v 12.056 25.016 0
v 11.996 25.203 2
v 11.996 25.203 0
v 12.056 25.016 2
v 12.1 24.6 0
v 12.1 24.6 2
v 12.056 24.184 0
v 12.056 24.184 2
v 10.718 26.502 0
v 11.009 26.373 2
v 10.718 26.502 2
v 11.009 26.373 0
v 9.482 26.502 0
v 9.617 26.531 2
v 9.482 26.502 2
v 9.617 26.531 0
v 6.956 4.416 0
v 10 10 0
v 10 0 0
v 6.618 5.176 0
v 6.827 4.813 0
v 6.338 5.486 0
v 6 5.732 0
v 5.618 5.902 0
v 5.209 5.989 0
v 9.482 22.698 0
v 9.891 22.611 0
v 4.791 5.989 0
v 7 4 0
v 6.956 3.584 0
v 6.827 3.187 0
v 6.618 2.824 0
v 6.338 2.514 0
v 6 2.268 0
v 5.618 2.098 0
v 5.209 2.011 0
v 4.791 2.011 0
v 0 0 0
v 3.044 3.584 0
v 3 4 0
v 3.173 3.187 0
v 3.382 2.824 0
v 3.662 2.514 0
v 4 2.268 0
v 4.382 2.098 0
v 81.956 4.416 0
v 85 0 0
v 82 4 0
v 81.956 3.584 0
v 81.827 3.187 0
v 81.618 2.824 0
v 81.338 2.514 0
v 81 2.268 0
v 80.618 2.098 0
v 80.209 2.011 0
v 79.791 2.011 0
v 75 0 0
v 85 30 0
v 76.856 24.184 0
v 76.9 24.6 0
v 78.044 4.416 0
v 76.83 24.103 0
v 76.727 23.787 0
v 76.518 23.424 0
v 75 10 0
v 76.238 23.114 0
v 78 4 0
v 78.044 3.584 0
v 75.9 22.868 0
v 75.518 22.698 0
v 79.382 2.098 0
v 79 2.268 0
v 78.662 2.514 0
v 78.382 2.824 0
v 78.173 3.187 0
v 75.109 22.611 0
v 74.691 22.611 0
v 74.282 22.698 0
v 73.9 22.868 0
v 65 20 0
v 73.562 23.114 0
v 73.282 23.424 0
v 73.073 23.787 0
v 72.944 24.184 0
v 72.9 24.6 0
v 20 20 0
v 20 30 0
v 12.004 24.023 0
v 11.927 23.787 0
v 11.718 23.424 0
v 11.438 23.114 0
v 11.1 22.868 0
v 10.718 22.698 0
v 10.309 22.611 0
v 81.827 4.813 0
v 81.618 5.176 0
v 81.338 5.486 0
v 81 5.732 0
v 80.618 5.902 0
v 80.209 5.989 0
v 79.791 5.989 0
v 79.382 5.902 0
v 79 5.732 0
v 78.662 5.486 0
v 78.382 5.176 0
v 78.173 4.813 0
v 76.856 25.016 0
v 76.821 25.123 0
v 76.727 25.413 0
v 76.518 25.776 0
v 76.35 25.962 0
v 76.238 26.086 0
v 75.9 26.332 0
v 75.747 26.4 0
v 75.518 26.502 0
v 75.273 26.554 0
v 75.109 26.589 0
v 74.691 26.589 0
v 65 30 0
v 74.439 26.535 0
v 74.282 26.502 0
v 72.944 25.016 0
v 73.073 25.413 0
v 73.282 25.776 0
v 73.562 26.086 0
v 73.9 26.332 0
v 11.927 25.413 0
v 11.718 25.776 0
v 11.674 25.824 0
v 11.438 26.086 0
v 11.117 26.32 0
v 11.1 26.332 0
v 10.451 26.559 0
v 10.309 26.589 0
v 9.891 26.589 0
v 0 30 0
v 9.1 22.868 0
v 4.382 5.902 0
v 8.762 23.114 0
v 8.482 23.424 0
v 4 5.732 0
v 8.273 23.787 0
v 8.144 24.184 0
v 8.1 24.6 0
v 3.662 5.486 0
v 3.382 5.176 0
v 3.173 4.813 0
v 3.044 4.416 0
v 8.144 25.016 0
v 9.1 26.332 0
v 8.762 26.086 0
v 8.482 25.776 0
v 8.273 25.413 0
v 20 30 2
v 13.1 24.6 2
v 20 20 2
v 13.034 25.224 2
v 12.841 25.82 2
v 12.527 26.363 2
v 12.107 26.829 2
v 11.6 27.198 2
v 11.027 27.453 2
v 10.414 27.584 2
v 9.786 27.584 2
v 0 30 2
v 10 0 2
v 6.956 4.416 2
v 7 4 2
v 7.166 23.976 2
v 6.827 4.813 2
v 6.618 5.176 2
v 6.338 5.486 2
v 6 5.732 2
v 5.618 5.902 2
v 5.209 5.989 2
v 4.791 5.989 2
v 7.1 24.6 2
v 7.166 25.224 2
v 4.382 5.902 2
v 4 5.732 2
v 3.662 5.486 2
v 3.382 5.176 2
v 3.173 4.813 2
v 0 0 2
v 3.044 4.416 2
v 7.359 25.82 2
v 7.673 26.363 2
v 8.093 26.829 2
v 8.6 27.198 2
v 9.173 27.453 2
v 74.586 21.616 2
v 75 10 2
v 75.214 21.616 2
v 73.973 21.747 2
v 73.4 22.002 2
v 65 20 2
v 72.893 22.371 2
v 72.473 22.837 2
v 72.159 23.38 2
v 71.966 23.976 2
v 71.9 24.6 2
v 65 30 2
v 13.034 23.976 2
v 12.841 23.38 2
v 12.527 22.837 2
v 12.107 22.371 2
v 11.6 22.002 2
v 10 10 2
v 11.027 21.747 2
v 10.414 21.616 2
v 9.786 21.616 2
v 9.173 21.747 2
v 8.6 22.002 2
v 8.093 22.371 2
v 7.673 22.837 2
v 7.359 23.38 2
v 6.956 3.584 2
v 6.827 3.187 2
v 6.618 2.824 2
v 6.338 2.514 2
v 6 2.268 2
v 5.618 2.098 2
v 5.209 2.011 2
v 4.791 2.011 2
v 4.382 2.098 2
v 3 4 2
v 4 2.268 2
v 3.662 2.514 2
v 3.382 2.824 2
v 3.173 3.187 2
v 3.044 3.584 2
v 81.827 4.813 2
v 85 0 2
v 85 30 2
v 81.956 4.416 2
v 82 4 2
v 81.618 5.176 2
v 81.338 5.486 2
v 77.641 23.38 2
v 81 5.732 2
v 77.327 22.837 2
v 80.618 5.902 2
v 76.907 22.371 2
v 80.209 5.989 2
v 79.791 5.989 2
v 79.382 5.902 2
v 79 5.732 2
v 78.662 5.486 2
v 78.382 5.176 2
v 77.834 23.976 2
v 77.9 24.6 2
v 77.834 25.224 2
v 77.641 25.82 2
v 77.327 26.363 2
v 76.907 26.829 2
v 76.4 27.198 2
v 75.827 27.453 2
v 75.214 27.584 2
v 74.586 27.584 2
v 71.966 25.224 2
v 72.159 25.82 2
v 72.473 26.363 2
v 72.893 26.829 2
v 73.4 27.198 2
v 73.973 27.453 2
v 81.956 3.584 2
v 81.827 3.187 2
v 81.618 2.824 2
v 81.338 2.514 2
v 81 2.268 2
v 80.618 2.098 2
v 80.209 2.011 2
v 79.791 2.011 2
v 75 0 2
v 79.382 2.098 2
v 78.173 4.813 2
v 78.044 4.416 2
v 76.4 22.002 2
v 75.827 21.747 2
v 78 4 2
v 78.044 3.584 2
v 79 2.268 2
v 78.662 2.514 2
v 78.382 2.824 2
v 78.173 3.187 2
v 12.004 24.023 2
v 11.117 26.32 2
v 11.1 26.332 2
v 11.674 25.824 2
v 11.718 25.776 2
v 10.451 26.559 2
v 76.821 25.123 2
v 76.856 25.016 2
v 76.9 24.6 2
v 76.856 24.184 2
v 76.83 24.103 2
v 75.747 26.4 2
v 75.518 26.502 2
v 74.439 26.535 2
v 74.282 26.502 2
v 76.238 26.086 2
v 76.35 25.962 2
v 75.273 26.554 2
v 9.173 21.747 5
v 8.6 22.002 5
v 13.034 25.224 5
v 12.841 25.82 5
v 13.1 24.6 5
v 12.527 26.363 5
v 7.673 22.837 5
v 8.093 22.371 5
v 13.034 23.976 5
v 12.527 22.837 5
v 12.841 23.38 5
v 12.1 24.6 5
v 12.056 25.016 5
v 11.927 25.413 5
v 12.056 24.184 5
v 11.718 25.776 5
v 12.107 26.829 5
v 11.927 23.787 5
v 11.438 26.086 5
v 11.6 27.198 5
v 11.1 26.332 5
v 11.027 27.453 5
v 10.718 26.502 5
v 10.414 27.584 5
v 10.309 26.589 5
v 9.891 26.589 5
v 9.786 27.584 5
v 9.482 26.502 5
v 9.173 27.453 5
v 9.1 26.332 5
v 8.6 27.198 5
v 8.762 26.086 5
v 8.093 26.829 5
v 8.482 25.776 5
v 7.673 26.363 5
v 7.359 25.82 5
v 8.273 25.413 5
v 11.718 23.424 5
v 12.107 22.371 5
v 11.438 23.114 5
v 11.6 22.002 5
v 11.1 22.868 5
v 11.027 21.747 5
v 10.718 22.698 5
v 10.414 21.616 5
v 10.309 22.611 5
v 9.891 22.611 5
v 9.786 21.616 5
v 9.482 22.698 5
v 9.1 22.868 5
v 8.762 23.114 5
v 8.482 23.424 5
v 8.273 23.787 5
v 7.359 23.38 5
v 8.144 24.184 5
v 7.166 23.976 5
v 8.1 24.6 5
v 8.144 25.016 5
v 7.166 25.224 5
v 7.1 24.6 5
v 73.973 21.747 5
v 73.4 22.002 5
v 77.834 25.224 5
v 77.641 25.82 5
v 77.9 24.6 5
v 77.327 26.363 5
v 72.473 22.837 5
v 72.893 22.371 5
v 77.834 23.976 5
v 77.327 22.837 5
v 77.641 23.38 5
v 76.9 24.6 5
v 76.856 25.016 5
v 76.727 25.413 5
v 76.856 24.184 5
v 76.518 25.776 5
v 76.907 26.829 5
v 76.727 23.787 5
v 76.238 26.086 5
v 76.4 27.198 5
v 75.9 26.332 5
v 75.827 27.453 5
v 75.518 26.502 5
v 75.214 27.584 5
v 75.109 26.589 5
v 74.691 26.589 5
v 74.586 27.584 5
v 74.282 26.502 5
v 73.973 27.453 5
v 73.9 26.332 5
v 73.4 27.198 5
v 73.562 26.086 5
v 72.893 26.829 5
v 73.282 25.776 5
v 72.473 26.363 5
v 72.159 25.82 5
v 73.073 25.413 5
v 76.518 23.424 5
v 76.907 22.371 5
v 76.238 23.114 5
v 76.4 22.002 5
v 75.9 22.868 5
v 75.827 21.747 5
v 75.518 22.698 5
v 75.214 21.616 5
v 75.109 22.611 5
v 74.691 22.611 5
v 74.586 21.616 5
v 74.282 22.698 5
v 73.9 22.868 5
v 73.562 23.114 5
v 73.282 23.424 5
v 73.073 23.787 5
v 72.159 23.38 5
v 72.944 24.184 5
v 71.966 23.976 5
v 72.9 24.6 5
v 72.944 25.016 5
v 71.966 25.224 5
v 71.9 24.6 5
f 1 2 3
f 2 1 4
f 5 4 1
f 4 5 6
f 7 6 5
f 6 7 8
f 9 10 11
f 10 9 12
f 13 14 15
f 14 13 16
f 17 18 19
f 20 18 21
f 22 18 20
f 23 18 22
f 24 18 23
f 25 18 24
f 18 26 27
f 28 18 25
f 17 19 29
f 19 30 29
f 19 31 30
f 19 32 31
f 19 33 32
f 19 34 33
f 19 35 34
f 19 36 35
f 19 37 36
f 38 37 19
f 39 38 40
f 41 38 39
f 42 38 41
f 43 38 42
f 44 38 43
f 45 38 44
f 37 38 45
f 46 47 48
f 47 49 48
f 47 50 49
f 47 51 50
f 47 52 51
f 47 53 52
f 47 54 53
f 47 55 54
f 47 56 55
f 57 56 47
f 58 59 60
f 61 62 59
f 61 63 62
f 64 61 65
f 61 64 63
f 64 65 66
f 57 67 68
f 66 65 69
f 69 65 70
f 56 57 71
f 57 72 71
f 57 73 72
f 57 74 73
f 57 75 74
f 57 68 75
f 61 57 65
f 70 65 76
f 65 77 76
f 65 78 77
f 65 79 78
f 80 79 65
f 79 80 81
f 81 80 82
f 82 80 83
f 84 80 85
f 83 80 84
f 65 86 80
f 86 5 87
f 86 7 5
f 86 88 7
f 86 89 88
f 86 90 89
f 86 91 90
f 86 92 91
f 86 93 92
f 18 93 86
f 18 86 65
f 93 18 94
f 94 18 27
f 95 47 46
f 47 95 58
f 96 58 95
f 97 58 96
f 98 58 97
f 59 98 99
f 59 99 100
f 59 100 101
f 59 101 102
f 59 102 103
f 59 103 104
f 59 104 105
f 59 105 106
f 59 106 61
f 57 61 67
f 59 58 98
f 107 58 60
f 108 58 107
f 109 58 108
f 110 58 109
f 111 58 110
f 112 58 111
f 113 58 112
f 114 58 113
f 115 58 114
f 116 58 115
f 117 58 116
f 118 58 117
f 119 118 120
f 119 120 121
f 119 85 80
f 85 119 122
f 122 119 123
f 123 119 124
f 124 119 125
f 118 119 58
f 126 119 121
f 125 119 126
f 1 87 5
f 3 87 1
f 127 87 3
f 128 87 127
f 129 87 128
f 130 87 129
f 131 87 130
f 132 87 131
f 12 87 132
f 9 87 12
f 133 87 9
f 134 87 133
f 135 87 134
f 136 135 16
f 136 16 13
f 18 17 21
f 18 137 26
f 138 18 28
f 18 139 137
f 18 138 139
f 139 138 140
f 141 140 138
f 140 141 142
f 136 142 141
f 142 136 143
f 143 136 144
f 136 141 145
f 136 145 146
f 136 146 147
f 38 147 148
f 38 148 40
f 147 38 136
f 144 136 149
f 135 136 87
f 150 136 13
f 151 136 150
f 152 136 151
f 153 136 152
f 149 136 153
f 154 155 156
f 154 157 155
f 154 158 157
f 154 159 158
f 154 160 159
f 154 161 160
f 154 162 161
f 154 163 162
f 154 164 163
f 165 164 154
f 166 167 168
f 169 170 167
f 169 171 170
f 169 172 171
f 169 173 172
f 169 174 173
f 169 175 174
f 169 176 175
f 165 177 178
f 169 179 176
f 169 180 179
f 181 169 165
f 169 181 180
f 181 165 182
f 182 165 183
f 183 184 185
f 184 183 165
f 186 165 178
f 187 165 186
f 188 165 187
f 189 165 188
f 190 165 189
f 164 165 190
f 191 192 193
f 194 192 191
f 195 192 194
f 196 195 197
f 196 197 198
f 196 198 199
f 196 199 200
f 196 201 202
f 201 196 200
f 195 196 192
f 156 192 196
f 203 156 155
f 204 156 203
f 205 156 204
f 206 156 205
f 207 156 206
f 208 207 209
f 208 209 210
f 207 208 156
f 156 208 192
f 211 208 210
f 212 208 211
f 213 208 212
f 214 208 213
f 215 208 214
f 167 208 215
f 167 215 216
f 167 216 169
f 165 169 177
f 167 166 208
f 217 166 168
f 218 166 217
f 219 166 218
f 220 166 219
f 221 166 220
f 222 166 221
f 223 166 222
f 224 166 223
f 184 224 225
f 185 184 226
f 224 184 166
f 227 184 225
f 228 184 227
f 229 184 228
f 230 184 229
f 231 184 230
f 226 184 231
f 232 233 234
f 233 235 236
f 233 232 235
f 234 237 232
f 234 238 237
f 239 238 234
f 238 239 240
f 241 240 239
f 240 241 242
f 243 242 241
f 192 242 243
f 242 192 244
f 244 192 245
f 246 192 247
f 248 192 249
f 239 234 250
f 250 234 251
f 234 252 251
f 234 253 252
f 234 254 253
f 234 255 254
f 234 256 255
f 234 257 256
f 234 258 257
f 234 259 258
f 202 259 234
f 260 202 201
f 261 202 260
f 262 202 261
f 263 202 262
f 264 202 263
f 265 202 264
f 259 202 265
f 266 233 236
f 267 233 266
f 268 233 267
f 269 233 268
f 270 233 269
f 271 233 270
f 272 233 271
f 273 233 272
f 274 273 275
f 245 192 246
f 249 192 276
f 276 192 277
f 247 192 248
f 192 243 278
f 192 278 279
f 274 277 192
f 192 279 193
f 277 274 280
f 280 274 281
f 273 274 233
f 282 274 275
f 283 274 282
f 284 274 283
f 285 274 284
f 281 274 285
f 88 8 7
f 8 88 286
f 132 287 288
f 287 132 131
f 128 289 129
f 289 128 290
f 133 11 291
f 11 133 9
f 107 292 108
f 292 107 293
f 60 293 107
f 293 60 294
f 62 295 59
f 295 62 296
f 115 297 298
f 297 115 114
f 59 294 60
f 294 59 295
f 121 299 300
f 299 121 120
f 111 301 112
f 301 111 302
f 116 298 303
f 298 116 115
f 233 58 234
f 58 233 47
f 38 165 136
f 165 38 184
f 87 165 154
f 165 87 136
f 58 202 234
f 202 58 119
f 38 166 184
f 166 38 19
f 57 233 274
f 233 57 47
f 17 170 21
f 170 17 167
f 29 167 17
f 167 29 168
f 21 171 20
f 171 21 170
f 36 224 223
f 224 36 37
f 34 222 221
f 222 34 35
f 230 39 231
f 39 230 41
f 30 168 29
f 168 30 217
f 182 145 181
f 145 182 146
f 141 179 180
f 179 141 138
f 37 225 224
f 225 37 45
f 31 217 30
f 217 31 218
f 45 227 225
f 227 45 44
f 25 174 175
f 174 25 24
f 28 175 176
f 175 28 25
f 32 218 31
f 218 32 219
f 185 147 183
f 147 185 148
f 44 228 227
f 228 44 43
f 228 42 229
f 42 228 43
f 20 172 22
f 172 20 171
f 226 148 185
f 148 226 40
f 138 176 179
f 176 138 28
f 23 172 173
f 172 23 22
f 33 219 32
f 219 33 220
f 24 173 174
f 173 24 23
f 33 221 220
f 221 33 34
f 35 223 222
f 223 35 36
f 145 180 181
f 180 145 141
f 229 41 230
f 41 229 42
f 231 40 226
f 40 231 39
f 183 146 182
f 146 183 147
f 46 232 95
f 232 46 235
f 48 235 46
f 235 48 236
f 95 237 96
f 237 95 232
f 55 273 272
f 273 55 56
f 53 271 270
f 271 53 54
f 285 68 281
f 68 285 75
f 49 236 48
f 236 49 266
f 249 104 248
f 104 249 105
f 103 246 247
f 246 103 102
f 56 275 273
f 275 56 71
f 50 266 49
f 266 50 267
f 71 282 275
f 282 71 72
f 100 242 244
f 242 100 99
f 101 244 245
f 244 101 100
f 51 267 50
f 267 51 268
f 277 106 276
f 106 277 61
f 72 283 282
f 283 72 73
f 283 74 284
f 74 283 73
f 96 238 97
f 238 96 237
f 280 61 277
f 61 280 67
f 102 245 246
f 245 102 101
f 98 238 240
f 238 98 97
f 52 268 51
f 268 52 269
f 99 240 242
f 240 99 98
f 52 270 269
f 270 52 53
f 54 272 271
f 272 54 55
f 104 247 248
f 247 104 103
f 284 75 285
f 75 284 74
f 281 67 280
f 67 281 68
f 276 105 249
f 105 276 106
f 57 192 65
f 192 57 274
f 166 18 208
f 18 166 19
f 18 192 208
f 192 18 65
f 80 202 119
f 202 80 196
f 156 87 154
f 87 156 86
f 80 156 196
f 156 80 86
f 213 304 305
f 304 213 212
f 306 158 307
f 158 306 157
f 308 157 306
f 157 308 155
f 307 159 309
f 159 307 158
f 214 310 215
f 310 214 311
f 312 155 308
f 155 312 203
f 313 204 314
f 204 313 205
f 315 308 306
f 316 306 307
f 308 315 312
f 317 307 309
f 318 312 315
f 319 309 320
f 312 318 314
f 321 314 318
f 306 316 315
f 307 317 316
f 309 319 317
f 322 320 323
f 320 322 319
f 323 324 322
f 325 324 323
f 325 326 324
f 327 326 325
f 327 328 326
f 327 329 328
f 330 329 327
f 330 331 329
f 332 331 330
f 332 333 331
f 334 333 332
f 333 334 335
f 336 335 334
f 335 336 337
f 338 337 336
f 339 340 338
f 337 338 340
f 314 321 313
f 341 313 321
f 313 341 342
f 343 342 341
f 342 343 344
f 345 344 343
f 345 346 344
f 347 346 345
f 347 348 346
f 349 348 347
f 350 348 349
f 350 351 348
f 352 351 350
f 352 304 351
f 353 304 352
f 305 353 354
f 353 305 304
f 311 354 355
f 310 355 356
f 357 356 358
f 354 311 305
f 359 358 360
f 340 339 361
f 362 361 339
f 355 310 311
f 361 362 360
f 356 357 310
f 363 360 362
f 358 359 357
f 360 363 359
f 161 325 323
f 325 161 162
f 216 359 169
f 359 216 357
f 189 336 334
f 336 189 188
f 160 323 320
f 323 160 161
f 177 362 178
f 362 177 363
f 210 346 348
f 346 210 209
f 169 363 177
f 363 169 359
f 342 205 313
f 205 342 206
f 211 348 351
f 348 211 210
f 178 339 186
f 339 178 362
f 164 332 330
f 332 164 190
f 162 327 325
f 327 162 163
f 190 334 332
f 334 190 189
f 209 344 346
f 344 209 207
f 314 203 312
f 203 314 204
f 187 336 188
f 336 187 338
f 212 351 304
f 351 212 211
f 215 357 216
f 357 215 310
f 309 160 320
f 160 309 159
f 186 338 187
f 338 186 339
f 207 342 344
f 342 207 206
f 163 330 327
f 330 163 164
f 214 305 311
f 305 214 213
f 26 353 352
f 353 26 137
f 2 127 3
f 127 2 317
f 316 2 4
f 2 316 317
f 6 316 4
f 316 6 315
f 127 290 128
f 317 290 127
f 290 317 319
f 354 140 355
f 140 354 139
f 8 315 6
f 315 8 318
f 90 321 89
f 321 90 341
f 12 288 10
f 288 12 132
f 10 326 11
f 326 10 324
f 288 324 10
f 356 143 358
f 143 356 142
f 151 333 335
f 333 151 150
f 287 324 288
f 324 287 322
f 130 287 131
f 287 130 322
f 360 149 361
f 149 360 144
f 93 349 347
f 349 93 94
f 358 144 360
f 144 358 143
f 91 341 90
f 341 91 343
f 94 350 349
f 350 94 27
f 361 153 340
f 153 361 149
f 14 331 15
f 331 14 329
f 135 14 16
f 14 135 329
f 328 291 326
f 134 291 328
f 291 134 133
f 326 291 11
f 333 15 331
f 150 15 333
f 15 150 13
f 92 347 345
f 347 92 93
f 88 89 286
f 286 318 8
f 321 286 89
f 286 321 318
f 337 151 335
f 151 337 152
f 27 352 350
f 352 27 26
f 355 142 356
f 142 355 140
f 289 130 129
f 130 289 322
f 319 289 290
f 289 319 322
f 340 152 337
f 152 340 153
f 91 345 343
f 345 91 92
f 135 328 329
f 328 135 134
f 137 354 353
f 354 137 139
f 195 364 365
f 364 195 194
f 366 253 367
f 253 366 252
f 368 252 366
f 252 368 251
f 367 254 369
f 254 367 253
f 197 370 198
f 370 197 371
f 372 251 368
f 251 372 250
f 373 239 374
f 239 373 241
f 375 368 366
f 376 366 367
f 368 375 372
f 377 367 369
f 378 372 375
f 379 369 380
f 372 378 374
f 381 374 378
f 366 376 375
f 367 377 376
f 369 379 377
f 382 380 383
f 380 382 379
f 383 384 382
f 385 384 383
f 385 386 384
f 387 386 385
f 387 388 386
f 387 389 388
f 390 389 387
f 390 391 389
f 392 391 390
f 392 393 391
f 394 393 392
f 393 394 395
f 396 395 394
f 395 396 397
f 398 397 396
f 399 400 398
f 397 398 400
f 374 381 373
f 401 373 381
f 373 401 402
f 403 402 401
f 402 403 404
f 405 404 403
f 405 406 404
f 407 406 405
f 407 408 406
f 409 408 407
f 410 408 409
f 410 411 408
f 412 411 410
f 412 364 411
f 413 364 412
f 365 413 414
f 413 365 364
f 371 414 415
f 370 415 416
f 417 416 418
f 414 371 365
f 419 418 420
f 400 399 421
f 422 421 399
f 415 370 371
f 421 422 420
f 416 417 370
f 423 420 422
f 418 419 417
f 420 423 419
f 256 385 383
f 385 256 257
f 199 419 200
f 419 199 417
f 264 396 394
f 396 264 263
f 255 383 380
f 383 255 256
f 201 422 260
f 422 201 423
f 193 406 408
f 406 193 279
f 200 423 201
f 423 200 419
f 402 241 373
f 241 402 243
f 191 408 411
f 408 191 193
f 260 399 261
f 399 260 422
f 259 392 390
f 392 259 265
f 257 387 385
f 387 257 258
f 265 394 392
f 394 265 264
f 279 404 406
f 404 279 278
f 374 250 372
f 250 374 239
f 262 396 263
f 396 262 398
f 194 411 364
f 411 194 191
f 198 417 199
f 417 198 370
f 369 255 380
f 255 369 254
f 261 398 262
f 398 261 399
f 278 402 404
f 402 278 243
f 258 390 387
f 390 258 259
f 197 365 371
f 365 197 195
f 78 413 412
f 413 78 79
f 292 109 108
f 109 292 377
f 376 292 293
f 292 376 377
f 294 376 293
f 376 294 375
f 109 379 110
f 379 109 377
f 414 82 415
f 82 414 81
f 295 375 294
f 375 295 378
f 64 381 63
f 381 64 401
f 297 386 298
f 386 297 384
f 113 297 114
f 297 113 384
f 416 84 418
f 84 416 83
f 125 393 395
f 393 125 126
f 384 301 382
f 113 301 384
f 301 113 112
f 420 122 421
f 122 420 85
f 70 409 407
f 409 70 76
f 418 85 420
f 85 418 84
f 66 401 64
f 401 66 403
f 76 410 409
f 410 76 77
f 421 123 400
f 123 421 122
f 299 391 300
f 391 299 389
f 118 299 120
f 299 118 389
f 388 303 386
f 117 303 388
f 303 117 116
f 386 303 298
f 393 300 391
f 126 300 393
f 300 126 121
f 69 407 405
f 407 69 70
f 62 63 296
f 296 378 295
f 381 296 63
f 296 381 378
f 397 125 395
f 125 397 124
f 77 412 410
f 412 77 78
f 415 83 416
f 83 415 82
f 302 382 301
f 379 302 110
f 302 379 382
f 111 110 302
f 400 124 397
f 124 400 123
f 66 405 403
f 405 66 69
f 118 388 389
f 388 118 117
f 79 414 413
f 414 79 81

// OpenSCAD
/************************************************************************
	PT65A bracket for Acorn BBC Master.scad
    
	3D Printable PT65A PSU Mounting bracket for the Acorn BBC Master
    Copyright (C) 2019 Simon Inns
	    
    This program is free software: you can redistribute it and/or modify
	it under the terms of the GNU General Public License as published by
	the Free Software Foundation, either version 3 of the License, or
	(at your option) any later version.
    
    This program is distributed in the hope that it will be useful,
    but WITHOUT ANY WARRANTY; without even the implied warranty of
    MERCHANTABILITY or FITNESS FOR A PARTICULAR PURPOSE.  See the
    GNU General Public License for more details.
    
    You should have received a copy of the GNU General Public License
    along with this program.  If not, see <http://www.gnu.org/licenses/>.
	
    Email: simon.inns@gmail.com
    
************************************************************************/

$fn=30;

// Base plate is 165mm x 85mm (same size as original PSU)
basePlate_width = 85;
basePlate_length = 165;
basePlate_thickness = 2;

// Base plate screw holes are 157mm apart lengthwise and
// 75mm apart crosswise
basePlate_screwDistanceWidth = 75;
basePlate_screwDistanceLength = 157;

// Base plate screw holes are 4mm diameter
basePlate_screwHoleRadius = 4 / 2;

// PT65A is 127 x 76mm wide
pt65a_width = 76;
pt65a_length = 127;

// PT65A screw holes are 115.8mm apart lengthwise and
// 68.4mm apart crosswise
pt65a_screwDistanceWidth = 64.8;
pt65a_screwDistanceLength = 115.8;

// PT65A screw holes are 4mm diameter
pt65a_screwHoleRadius = 4 / 2;

// PT65A standoffs are 6mm diameter
pt65a_standoffRadius = 6 / 2;

// PT65A standoffs are 3mm high
pt65a_standoffHeight = 3;

difference() {
    // Draw the base plate (same dimensions as the original PSU)
    cube([basePlate_width, 30, basePlate_thickness]);
    
    // 2 Screw holes for attaching the base plate to the case of the original PSU
    // Mounting screw hole 1 (4mm diameter) - case
    translate([(basePlate_width - basePlate_screwDistanceWidth) / 2,
        (basePlate_length - basePlate_screwDistanceLength) / 2, 0]) 
    {
        cylinder(h = basePlate_thickness, r = basePlate_screwHoleRadius);
    }
    
    // Mounting screw hole 2 (4mm diameter) - case
    translate([basePlate_width - ((basePlate_width - basePlate_screwDistanceWidth) / 2),
        (basePlate_length - basePlate_screwDistanceLength) / 2, 0]) 
    {
        cylinder(h = basePlate_thickness, r = basePlate_screwHoleRadius);
    }
    
    // 2 Screw holes for mounting the PT65A to the base plate
    translate([(basePlate_width - pt65a_width) / 2,
        (basePlate_length - pt65a_length) / 2, 0]) {
        // Mounting screw hole 1 (4mm diameter) - PT65A
        translate([(pt65a_width - pt65a_screwDistanceWidth) / 2,
            (pt65a_length - pt65a_screwDistanceLength) / 2, 0]) 
        {
            cylinder(h = basePlate_thickness, r = pt65a_screwHoleRadius);
        }
        
        // Mounting screw hole 2 (4mm diameter) - PT65A
        translate([pt65a_width - ((pt65a_width - pt65a_screwDistanceWidth) / 2),
            (pt65a_length - pt65a_screwDistanceLength) / 2, 0]) 
        {
            cylinder(h = basePlate_thickness, r = pt65a_screwHoleRadius);
        }
    }

    // Cut outs for clearance and to save some plastic
    translate([10, 0, 0]) {
    cube([(basePlate_width - 20), 10, basePlate_thickness]);
    }
    
    translate([20, 30-10, 0]) {
    cube([(basePlate_width - 40), 10, basePlate_thickness]);
    }
}

// 2 standoffs for mounting the PT65A to the base plate
translate([(basePlate_width - pt65a_width) / 2,
    (basePlate_length - pt65a_length) / 2, 0]) {
    // Standoff 1
    translate([(pt65a_width - pt65a_screwDistanceWidth) / 2,
        (pt65a_length - pt65a_screwDistanceLength) / 2, 0]) 
    {
        difference() {
            cylinder(h = pt65a_standoffHeight + basePlate_thickness, r = pt65a_standoffRadius);
            cylinder(h = pt65a_standoffHeight + basePlate_thickness, r = pt65a_screwHoleRadius);
        }
    }
    
    // Standoff 2
    translate([pt65a_width - ((pt65a_width - pt65a_screwDistanceWidth) / 2),
        (pt65a_length - pt65a_screwDistanceLength) / 2, 0]) 
    {
        difference() {
            cylinder(h = pt65a_standoffHeight + basePlate_thickness, r = pt65a_standoffRadius);
            cylinder(h = pt65a_standoffHeight + basePlate_thickness, r = pt65a_screwHoleRadius);
        }
    }
}
